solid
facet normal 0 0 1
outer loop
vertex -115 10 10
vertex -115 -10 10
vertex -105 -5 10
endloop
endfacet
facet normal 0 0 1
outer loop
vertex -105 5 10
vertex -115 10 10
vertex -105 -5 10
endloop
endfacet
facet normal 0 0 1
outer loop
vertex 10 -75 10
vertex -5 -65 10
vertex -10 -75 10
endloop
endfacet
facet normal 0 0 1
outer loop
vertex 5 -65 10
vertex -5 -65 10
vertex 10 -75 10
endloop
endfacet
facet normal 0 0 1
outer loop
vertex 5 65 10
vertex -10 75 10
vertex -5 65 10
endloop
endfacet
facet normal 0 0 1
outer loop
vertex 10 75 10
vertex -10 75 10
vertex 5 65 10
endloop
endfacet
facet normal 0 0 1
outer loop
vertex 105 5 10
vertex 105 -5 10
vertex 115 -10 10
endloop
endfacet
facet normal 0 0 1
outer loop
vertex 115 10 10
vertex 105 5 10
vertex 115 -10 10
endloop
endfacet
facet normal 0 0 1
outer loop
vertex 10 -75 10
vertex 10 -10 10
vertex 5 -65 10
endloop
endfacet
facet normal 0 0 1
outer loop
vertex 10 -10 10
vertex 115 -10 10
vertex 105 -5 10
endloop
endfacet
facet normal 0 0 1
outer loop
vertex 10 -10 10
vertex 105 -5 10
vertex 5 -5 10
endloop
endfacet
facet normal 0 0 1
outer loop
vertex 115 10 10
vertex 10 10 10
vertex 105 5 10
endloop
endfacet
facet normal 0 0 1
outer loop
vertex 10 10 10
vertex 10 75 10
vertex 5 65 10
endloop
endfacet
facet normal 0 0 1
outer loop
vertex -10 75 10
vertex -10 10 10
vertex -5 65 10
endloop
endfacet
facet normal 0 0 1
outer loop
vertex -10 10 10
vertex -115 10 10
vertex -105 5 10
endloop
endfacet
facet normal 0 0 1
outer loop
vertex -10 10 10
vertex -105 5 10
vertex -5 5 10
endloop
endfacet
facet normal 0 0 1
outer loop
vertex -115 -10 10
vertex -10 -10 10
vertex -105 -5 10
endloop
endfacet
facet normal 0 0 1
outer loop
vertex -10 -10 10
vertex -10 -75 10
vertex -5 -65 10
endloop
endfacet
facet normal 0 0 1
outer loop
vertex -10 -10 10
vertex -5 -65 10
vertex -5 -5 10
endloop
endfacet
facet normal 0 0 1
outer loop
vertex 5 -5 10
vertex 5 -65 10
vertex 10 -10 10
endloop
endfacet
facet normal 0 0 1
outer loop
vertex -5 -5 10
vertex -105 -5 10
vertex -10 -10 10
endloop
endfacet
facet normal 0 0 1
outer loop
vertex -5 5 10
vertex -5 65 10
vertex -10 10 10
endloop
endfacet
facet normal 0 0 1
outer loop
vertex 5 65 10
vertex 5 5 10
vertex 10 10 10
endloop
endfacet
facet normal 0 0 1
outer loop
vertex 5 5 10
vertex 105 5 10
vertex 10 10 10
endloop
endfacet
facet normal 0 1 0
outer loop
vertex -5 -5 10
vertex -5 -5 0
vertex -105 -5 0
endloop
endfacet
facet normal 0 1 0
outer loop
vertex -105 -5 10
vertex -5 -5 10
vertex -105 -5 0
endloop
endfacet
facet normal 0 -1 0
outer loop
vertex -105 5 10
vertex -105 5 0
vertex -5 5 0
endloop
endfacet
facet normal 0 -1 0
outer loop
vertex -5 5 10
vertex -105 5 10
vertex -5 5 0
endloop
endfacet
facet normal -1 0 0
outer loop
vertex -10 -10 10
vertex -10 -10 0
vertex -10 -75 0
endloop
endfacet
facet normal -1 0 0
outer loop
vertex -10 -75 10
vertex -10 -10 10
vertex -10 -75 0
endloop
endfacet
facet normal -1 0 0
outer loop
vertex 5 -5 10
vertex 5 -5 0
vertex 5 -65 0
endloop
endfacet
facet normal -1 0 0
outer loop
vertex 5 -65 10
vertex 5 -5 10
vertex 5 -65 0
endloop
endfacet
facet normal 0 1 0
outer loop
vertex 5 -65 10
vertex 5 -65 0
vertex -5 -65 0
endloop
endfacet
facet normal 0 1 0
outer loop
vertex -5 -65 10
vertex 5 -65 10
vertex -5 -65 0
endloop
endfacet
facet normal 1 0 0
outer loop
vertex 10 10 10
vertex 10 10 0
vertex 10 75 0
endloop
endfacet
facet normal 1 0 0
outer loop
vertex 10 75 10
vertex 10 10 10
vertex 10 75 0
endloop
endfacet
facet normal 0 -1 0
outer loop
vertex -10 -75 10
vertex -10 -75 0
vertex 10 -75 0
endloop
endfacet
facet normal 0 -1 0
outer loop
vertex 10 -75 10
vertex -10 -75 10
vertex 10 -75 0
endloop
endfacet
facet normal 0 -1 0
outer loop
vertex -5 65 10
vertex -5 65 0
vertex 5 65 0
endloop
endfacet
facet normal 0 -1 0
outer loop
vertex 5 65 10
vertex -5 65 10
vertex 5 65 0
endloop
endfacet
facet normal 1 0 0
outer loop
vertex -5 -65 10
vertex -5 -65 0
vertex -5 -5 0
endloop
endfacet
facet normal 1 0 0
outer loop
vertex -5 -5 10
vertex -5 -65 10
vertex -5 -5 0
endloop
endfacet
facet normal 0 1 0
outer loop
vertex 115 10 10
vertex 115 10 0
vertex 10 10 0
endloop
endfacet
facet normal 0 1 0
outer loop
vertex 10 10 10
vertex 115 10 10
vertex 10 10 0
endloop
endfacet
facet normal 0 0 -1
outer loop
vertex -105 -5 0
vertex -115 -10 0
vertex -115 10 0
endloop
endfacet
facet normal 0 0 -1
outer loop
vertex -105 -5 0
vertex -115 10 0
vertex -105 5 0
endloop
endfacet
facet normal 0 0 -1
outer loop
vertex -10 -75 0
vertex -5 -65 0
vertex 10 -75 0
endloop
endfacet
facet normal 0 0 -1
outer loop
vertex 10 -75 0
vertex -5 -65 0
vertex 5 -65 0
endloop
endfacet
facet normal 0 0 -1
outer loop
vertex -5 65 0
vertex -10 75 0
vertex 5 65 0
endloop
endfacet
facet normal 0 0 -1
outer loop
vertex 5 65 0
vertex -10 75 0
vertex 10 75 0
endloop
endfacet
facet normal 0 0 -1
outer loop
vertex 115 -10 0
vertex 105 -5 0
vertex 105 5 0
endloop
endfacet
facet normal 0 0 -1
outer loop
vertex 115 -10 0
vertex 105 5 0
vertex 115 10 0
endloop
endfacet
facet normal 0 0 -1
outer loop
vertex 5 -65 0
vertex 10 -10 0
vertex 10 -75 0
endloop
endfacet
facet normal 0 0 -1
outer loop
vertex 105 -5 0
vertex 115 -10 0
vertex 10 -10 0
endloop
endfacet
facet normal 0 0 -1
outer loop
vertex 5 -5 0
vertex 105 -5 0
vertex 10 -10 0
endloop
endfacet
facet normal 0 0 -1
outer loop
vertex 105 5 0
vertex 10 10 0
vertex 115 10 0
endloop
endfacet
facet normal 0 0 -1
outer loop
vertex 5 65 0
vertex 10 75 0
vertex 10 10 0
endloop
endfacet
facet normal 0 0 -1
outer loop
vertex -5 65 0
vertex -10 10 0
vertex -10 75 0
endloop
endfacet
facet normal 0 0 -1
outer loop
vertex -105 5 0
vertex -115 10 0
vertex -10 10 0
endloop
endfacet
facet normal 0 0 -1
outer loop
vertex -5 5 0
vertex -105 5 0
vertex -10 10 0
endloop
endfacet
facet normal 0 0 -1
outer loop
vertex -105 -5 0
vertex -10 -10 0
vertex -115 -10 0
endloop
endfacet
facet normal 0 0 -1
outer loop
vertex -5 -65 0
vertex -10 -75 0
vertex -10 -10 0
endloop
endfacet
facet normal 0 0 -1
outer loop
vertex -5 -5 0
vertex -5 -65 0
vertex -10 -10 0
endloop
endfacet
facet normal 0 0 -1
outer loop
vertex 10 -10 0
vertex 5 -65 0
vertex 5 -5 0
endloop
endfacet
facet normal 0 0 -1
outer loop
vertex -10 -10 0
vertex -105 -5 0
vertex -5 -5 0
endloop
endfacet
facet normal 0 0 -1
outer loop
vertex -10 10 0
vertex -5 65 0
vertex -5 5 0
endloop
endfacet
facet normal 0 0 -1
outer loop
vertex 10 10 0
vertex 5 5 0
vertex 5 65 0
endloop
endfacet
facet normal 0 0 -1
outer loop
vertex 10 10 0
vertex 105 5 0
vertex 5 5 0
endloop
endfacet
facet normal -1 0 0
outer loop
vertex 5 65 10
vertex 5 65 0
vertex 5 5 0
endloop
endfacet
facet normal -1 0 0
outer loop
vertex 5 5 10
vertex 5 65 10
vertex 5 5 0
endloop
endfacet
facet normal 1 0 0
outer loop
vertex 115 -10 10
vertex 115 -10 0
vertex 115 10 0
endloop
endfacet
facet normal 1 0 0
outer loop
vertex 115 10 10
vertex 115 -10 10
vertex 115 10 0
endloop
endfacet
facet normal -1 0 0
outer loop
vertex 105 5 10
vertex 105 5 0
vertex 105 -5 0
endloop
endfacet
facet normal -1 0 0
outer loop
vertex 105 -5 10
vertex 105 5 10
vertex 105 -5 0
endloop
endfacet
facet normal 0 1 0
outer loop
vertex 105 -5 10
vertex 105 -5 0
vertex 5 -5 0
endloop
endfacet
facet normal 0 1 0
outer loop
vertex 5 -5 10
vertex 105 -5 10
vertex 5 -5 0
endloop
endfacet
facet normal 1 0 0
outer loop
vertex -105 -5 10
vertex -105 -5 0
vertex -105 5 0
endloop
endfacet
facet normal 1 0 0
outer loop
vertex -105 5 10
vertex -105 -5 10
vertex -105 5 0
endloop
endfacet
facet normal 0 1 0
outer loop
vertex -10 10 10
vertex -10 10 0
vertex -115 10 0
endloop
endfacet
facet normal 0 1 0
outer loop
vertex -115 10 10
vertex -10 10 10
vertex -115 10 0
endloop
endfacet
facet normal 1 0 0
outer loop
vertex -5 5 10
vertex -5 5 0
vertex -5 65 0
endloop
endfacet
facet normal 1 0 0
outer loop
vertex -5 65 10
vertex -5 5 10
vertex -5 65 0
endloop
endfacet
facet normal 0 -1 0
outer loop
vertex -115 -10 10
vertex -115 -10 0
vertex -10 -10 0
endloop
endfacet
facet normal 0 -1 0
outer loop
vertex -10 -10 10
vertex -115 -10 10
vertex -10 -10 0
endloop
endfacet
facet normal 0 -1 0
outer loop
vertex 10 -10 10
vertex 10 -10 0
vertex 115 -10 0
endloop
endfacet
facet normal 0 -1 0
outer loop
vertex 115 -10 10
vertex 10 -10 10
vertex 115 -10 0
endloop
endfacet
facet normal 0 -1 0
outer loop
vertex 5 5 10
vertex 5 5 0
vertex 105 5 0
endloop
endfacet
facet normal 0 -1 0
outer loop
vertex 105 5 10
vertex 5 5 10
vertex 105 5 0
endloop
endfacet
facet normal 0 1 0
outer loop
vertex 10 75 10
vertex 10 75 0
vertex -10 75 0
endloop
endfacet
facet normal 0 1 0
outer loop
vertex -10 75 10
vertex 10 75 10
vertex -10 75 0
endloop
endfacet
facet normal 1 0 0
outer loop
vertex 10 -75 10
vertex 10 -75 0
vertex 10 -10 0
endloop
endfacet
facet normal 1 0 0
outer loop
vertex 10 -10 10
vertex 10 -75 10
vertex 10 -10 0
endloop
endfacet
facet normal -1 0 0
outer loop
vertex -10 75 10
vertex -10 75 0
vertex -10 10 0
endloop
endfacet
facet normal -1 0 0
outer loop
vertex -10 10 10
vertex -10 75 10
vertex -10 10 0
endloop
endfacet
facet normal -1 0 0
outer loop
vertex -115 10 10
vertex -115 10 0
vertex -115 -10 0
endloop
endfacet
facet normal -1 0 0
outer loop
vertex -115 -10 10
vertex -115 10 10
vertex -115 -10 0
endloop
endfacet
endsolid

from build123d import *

# Parameters (mm, degrees)
F0_W     = 5
F0_H     = 5
F1_DEPTH = 10


with BuildPart() as f1:
    # F0 (on Top) → F1 (new body)
    with BuildSketch(Plane.XY):
        Polygon((-10, 10), (-115, 10), (-115, -10), (-10, -10), (-10, -5), (-105, -5), (-105, 5), (-10, 5), align=None)
        Polygon((-10, 75), (-10, 10), (-5, 10), (-5, 65), (5, 65), (5, 10), (10, 10), (10, 75), align=None)
        with Locations((-7.5, 7.5)):
            Rectangle(F0_W, F0_H)
        with Locations((-7.5, -7.5)):
            Rectangle(F0_W, F0_H)
        Polygon((-5, -10), (-10, -10), (-10, -75), (10, -75), (10, -10), (5, -10), (5, -65), (-5, -65), align=None)
        with Locations((7.5, 7.5)):
            Rectangle(F0_W, F0_H)
        Polygon((115, 10), (10, 10), (10, 5), (105, 5), (105, -5), (10, -5), (10, -10), (115, -10), align=None)
        with Locations((7.5, -7.5)):
            Rectangle(F0_W, F0_H)
    extrude(amount=F1_DEPTH)


solid = f1.part
